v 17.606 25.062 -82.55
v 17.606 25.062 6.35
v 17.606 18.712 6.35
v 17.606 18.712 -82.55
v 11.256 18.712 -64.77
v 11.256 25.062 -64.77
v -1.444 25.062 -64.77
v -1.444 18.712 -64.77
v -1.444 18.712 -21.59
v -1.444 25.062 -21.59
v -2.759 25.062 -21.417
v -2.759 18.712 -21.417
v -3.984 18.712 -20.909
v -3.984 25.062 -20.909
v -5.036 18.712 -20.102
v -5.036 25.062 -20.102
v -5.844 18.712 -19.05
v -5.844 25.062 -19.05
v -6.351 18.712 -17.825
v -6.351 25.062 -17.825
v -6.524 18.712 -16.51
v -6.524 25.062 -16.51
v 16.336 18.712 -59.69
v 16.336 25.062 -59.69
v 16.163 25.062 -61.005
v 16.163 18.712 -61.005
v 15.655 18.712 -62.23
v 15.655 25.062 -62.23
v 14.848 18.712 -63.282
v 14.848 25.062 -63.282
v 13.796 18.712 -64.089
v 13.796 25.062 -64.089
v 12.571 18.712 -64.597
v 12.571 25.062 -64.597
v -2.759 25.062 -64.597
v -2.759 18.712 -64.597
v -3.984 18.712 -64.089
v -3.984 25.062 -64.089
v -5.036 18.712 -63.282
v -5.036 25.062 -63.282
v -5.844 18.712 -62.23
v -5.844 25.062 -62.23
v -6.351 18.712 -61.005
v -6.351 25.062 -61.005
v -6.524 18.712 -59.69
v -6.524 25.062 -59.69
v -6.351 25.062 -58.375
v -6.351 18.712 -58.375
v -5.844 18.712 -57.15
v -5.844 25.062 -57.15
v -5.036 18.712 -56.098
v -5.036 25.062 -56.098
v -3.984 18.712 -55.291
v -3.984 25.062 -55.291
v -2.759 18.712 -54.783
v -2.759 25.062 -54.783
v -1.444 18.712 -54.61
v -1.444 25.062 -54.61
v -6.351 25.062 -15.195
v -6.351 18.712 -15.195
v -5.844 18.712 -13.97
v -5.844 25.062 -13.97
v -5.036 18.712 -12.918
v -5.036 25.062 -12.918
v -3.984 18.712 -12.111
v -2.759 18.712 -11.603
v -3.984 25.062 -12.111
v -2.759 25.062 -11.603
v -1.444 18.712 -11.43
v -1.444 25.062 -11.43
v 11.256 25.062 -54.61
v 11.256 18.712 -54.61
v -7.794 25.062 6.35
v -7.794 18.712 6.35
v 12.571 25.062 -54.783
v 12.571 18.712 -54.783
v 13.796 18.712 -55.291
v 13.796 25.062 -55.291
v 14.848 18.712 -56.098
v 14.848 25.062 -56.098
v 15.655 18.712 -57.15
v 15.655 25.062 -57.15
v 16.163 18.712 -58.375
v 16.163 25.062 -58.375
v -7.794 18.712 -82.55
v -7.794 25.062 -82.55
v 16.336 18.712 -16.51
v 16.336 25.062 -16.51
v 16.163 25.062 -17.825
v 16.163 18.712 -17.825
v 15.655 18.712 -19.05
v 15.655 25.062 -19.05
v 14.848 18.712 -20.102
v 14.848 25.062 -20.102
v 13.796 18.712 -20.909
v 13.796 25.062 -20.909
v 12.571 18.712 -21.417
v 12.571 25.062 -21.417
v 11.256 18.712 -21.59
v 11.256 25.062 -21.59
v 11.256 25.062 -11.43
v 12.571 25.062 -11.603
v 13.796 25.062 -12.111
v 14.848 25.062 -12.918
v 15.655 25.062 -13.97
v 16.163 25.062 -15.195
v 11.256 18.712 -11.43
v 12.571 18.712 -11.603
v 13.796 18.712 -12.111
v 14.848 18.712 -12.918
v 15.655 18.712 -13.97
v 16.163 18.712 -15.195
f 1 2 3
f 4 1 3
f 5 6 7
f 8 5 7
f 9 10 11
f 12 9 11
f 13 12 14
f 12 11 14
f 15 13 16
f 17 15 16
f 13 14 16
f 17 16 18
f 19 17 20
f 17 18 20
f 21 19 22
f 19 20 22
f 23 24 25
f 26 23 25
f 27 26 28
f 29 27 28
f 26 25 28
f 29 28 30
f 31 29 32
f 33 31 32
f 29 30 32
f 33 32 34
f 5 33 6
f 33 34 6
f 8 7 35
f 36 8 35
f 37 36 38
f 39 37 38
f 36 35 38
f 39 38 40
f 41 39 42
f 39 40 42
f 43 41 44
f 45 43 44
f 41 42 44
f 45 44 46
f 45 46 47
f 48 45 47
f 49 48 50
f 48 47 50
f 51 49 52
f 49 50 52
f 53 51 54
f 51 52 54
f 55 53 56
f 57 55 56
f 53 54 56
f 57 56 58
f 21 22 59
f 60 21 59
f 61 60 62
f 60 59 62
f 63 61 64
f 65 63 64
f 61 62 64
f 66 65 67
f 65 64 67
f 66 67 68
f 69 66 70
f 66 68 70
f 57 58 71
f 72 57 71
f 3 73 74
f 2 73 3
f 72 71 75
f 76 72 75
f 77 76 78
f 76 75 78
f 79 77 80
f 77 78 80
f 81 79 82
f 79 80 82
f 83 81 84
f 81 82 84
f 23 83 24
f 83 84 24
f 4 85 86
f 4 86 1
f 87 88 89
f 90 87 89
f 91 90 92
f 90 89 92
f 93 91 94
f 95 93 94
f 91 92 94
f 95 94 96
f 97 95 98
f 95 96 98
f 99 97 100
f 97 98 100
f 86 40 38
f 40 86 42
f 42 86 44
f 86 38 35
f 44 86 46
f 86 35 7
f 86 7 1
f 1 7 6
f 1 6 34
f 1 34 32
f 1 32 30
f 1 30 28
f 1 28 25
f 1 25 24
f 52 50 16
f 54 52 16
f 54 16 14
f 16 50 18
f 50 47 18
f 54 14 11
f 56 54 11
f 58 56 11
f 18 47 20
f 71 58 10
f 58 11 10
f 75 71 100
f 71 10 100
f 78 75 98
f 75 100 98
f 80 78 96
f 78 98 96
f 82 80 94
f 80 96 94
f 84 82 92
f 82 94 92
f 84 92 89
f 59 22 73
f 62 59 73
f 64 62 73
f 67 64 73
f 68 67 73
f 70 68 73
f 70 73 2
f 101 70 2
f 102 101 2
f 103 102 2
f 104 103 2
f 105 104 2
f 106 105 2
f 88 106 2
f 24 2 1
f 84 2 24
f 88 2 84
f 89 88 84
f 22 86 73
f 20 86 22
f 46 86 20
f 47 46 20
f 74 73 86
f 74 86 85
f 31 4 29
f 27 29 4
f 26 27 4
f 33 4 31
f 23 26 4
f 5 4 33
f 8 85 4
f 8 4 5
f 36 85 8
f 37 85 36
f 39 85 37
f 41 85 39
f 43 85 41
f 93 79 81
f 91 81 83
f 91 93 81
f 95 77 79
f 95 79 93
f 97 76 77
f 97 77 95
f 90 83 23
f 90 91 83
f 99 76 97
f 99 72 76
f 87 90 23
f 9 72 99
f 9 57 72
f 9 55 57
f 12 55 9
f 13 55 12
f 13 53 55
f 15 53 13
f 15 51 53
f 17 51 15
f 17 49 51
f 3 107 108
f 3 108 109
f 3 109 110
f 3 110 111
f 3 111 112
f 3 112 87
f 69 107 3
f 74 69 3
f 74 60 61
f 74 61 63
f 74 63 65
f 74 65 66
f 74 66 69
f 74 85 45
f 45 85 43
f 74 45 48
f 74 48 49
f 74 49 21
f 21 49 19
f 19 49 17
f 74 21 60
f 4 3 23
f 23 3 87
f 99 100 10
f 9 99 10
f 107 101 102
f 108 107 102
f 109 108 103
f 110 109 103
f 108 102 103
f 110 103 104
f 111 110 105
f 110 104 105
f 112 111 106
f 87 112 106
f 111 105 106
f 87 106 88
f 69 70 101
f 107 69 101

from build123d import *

# Parameters (mm, degrees)
F0_W     = 25.4
F0_H     = 63.5
F1_DEPTH = 6.35
F2_W     = 25.4
F2_H     = 6.35
F3_DEPTH = 82.55
F5_DEPTH = 25.4
F6_W     = 57.15
F6_H     = 6.35
F7_DEPTH = 25.4


with BuildPart() as f1:
    # F0 (on Top) → F1 (new body)
    with BuildSketch(Plane.XY):
        with Locations((4.9058877259, -6.6879848838)):
            Rectangle(F0_W, F0_H)
    extrude(amount=F1_DEPTH)

    # F2 (on face) → F3 (join)
    with BuildSketch(Plane(origin=(0, 0, 0), x_dir=(1, 0, 0), z_dir=(0, 0, -1))):
        with Locations((4.9058877259, -21.8870151162)):
            Rectangle(F2_W, F2_H)
    extrude(amount=F3_DEPTH)

    # F4 (on face) → F5 (cut)
    with BuildSketch(Plane(origin=(0, 25.0620151162, 0), x_dir=(-1, 0, 0), z_dir=(0, 1, 0))):
        with BuildLine():
            Line((-6.1758877259, -16.51), (-11.2558877259, -16.51))
            Line((-11.2558877259, -16.51), (-11.2558877259, -21.59))
            ThreePointArc((-11.2558877259, -21.59), (-7.6637852775, -20.1021024484), (-6.1758877259, -16.51))
        make_face()
        with BuildLine():
            Line((-11.2558877259, -21.59), (-11.2558877259, -16.51))
            Line((-11.2558877259, -16.51), (-16.3358877259, -16.51))
            ThreePointArc((-16.3358877259, -16.51), (-14.8479901744, -20.1021024484), (-11.2558877259, -21.59))
        make_face()
        with BuildLine():
            Line((-11.2558877259, -16.51), (-11.2558877259, -11.43))
            ThreePointArc((-11.2558877259, -11.43), (-14.8479901744, -12.9178975516), (-16.3358877259, -16.51))
            Line((-16.3358877259, -16.51), (-11.2558877259, -16.51))
        make_face()
        with BuildLine():
            Line((1.4441122717, -11.43), (-11.2558877259, -11.43))
            ThreePointArc((-11.2558877259, -11.43), (-7.6637852775, -12.9178975516), (-6.1758877259, -16.51))
            Line((-6.1758877259, -16.51), (-3.6358877259, -16.51))
            ThreePointArc((-3.6358877259, -16.51), (-2.1479901752, -12.9178975524), (1.4441122717, -11.43))
        make_face()
        with BuildLine():
            Line((1.4441122741, -16.51), (1.4441122741, -11.43))
            ThreePointArc((1.4441122717, -11.43), (-2.1479901752, -12.9178975524), (-3.6358877259, -16.51))
            Line((-3.6358877259, -16.51), (1.4441122741, -16.51))
        make_face()
        with BuildLine():
            ThreePointArc((6.5241122741, -16.51), (5.0362147216, -12.9178975507), (1.4441122717, -11.43))
            Line((1.4441122741, -11.43), (1.4441122741, -16.51))
            Line((1.4441122741, -16.51), (6.5241122741, -16.51))
        make_face()
        with BuildLine():
            Line((6.5241122741, -16.51), (1.4441122741, -16.51))
            Line((1.4441122741, -16.51), (1.4441122741, -21.59))
            ThreePointArc((1.4441122741, -21.59), (5.0362147225, -20.1021024484), (6.5241122741, -16.51))
        make_face()
        with BuildLine():
            Line((-3.6358877259, -16.51), (-6.1758877259, -16.51))
            ThreePointArc((-6.1758877259, -16.51), (-7.6637852775, -20.1021024484), (-11.2558877259, -21.59))
            Line((-11.2558877259, -21.59), (1.4441122741, -21.59))
            ThreePointArc((1.4441122741, -21.59), (-2.1479901744, -20.1021024484), (-3.6358877259, -16.51))
        make_face()
        with BuildLine():
            Line((1.4441122741, -21.59), (1.4441122741, -16.51))
            Line((1.4441122741, -16.51), (-3.6358877259, -16.51))
            ThreePointArc((-3.6358877259, -16.51), (-2.1479901744, -20.1021024484), (1.4441122741, -21.59))
        make_face()
        with BuildLine():
            ThreePointArc((-6.1758877259, -16.51), (-7.6637852775, -12.9178975516), (-11.2558877259, -11.43))
            Line((-11.2558877259, -11.43), (-11.2558877259, -16.51))
            Line((-11.2558877259, -16.51), (-6.1758877259, -16.51))
        make_face()
        with BuildLine():
            Line((-11.2558877259, -59.69), (-11.2558877259, -54.61))
            ThreePointArc((-11.2558877221, -54.61), (-14.847990173, -56.0978975502), (-16.3358877259, -59.69))
            Line((-16.3358877259, -59.69), (-11.2558877259, -59.69))
        make_face()
        with BuildLine():
            ThreePointArc((-6.1758877259, -59.69), (-7.6637852762, -56.0978975529), (-11.2558877221, -54.61))
            Line((-11.2558877259, -54.61), (-11.2558877259, -59.69))
            Line((-11.2558877259, -59.69), (-6.1758877259, -59.69))
        make_face()
        with BuildLine():
            Line((-6.1758877259, -59.69), (-11.2558877259, -59.69))
            Line((-11.2558877259, -59.69), (-11.2558877259, -64.77))
            ThreePointArc((-11.2558877259, -64.77), (-7.6637852775, -63.2821024484), (-6.1758877259, -59.69))
        make_face()
        with BuildLine():
            Line((-11.2558877259, -64.77), (-11.2558877259, -59.69))
            Line((-11.2558877259, -59.69), (-16.3358877259, -59.69))
            ThreePointArc((-16.3358877259, -59.69), (-14.8479901744, -63.2821024484), (-11.2558877259, -64.77))
        make_face()
        with BuildLine():
            Line((1.4441122741, -54.61), (-11.2558877221, -54.61))
            ThreePointArc((-11.2558877221, -54.61), (-7.6637852762, -56.0978975529), (-6.1758877259, -59.69))
            Line((-6.1758877259, -59.69), (-3.6358877259, -59.69))
            ThreePointArc((-3.6358877259, -59.69), (-2.1479901744, -56.0978975516), (1.4441122741, -54.61))
        make_face()
        with BuildLine():
            Line((1.4441122741, -59.69), (1.4441122741, -54.61))
            ThreePointArc((1.4441122741, -54.61), (-2.1479901744, -56.0978975516), (-3.6358877259, -59.69))
            Line((-3.6358877259, -59.69), (1.4441122741, -59.69))
        make_face()
        with BuildLine():
            Line((1.4441122741, -64.77), (1.4441122741, -59.69))
            Line((1.4441122741, -59.69), (-3.6358877259, -59.69))
            ThreePointArc((-3.6358877259, -59.69), (-2.1479901744, -63.2821024484), (1.4441122741, -64.77))
        make_face()
        with BuildLine():
            Line((-3.6358877259, -59.69), (-6.1758877259, -59.69))
            ThreePointArc((-6.1758877259, -59.69), (-7.6637852775, -63.2821024484), (-11.2558877259, -64.77))
            Line((-11.2558877259, -64.77), (1.4441122741, -64.77))
            ThreePointArc((1.4441122741, -64.77), (-2.1479901744, -63.2821024484), (-3.6358877259, -59.69))
        make_face()
        with BuildLine():
            ThreePointArc((6.5241122741, -59.69), (5.0362147225, -56.0978975516), (1.4441122741, -54.61))
            Line((1.4441122741, -54.61), (1.4441122741, -59.69))
            Line((1.4441122741, -59.69), (6.5241122741, -59.69))
        make_face()
        with BuildLine():
            Line((6.5241122741, -59.69), (1.4441122741, -59.69))
            Line((1.4441122741, -59.69), (1.4441122741, -64.77))
            ThreePointArc((1.4441122741, -64.77), (5.0362147225, -63.2821024484), (6.5241122741, -59.69))
        make_face()
    extrude(amount=-F5_DEPTH, mode=Mode.SUBTRACT)

    # F6 (on face) → F7 (cut)
    with BuildSketch(Plane(origin=(-7.7941122741, 0, 0), x_dir=(0, -1, 0), z_dir=(-1, 0, 0))):
        with Locations((9.8629848838, 3.175)):
            Rectangle(F6_W, F6_H)
    extrude(amount=-F7_DEPTH, mode=Mode.SUBTRACT)


solid = f1.part
